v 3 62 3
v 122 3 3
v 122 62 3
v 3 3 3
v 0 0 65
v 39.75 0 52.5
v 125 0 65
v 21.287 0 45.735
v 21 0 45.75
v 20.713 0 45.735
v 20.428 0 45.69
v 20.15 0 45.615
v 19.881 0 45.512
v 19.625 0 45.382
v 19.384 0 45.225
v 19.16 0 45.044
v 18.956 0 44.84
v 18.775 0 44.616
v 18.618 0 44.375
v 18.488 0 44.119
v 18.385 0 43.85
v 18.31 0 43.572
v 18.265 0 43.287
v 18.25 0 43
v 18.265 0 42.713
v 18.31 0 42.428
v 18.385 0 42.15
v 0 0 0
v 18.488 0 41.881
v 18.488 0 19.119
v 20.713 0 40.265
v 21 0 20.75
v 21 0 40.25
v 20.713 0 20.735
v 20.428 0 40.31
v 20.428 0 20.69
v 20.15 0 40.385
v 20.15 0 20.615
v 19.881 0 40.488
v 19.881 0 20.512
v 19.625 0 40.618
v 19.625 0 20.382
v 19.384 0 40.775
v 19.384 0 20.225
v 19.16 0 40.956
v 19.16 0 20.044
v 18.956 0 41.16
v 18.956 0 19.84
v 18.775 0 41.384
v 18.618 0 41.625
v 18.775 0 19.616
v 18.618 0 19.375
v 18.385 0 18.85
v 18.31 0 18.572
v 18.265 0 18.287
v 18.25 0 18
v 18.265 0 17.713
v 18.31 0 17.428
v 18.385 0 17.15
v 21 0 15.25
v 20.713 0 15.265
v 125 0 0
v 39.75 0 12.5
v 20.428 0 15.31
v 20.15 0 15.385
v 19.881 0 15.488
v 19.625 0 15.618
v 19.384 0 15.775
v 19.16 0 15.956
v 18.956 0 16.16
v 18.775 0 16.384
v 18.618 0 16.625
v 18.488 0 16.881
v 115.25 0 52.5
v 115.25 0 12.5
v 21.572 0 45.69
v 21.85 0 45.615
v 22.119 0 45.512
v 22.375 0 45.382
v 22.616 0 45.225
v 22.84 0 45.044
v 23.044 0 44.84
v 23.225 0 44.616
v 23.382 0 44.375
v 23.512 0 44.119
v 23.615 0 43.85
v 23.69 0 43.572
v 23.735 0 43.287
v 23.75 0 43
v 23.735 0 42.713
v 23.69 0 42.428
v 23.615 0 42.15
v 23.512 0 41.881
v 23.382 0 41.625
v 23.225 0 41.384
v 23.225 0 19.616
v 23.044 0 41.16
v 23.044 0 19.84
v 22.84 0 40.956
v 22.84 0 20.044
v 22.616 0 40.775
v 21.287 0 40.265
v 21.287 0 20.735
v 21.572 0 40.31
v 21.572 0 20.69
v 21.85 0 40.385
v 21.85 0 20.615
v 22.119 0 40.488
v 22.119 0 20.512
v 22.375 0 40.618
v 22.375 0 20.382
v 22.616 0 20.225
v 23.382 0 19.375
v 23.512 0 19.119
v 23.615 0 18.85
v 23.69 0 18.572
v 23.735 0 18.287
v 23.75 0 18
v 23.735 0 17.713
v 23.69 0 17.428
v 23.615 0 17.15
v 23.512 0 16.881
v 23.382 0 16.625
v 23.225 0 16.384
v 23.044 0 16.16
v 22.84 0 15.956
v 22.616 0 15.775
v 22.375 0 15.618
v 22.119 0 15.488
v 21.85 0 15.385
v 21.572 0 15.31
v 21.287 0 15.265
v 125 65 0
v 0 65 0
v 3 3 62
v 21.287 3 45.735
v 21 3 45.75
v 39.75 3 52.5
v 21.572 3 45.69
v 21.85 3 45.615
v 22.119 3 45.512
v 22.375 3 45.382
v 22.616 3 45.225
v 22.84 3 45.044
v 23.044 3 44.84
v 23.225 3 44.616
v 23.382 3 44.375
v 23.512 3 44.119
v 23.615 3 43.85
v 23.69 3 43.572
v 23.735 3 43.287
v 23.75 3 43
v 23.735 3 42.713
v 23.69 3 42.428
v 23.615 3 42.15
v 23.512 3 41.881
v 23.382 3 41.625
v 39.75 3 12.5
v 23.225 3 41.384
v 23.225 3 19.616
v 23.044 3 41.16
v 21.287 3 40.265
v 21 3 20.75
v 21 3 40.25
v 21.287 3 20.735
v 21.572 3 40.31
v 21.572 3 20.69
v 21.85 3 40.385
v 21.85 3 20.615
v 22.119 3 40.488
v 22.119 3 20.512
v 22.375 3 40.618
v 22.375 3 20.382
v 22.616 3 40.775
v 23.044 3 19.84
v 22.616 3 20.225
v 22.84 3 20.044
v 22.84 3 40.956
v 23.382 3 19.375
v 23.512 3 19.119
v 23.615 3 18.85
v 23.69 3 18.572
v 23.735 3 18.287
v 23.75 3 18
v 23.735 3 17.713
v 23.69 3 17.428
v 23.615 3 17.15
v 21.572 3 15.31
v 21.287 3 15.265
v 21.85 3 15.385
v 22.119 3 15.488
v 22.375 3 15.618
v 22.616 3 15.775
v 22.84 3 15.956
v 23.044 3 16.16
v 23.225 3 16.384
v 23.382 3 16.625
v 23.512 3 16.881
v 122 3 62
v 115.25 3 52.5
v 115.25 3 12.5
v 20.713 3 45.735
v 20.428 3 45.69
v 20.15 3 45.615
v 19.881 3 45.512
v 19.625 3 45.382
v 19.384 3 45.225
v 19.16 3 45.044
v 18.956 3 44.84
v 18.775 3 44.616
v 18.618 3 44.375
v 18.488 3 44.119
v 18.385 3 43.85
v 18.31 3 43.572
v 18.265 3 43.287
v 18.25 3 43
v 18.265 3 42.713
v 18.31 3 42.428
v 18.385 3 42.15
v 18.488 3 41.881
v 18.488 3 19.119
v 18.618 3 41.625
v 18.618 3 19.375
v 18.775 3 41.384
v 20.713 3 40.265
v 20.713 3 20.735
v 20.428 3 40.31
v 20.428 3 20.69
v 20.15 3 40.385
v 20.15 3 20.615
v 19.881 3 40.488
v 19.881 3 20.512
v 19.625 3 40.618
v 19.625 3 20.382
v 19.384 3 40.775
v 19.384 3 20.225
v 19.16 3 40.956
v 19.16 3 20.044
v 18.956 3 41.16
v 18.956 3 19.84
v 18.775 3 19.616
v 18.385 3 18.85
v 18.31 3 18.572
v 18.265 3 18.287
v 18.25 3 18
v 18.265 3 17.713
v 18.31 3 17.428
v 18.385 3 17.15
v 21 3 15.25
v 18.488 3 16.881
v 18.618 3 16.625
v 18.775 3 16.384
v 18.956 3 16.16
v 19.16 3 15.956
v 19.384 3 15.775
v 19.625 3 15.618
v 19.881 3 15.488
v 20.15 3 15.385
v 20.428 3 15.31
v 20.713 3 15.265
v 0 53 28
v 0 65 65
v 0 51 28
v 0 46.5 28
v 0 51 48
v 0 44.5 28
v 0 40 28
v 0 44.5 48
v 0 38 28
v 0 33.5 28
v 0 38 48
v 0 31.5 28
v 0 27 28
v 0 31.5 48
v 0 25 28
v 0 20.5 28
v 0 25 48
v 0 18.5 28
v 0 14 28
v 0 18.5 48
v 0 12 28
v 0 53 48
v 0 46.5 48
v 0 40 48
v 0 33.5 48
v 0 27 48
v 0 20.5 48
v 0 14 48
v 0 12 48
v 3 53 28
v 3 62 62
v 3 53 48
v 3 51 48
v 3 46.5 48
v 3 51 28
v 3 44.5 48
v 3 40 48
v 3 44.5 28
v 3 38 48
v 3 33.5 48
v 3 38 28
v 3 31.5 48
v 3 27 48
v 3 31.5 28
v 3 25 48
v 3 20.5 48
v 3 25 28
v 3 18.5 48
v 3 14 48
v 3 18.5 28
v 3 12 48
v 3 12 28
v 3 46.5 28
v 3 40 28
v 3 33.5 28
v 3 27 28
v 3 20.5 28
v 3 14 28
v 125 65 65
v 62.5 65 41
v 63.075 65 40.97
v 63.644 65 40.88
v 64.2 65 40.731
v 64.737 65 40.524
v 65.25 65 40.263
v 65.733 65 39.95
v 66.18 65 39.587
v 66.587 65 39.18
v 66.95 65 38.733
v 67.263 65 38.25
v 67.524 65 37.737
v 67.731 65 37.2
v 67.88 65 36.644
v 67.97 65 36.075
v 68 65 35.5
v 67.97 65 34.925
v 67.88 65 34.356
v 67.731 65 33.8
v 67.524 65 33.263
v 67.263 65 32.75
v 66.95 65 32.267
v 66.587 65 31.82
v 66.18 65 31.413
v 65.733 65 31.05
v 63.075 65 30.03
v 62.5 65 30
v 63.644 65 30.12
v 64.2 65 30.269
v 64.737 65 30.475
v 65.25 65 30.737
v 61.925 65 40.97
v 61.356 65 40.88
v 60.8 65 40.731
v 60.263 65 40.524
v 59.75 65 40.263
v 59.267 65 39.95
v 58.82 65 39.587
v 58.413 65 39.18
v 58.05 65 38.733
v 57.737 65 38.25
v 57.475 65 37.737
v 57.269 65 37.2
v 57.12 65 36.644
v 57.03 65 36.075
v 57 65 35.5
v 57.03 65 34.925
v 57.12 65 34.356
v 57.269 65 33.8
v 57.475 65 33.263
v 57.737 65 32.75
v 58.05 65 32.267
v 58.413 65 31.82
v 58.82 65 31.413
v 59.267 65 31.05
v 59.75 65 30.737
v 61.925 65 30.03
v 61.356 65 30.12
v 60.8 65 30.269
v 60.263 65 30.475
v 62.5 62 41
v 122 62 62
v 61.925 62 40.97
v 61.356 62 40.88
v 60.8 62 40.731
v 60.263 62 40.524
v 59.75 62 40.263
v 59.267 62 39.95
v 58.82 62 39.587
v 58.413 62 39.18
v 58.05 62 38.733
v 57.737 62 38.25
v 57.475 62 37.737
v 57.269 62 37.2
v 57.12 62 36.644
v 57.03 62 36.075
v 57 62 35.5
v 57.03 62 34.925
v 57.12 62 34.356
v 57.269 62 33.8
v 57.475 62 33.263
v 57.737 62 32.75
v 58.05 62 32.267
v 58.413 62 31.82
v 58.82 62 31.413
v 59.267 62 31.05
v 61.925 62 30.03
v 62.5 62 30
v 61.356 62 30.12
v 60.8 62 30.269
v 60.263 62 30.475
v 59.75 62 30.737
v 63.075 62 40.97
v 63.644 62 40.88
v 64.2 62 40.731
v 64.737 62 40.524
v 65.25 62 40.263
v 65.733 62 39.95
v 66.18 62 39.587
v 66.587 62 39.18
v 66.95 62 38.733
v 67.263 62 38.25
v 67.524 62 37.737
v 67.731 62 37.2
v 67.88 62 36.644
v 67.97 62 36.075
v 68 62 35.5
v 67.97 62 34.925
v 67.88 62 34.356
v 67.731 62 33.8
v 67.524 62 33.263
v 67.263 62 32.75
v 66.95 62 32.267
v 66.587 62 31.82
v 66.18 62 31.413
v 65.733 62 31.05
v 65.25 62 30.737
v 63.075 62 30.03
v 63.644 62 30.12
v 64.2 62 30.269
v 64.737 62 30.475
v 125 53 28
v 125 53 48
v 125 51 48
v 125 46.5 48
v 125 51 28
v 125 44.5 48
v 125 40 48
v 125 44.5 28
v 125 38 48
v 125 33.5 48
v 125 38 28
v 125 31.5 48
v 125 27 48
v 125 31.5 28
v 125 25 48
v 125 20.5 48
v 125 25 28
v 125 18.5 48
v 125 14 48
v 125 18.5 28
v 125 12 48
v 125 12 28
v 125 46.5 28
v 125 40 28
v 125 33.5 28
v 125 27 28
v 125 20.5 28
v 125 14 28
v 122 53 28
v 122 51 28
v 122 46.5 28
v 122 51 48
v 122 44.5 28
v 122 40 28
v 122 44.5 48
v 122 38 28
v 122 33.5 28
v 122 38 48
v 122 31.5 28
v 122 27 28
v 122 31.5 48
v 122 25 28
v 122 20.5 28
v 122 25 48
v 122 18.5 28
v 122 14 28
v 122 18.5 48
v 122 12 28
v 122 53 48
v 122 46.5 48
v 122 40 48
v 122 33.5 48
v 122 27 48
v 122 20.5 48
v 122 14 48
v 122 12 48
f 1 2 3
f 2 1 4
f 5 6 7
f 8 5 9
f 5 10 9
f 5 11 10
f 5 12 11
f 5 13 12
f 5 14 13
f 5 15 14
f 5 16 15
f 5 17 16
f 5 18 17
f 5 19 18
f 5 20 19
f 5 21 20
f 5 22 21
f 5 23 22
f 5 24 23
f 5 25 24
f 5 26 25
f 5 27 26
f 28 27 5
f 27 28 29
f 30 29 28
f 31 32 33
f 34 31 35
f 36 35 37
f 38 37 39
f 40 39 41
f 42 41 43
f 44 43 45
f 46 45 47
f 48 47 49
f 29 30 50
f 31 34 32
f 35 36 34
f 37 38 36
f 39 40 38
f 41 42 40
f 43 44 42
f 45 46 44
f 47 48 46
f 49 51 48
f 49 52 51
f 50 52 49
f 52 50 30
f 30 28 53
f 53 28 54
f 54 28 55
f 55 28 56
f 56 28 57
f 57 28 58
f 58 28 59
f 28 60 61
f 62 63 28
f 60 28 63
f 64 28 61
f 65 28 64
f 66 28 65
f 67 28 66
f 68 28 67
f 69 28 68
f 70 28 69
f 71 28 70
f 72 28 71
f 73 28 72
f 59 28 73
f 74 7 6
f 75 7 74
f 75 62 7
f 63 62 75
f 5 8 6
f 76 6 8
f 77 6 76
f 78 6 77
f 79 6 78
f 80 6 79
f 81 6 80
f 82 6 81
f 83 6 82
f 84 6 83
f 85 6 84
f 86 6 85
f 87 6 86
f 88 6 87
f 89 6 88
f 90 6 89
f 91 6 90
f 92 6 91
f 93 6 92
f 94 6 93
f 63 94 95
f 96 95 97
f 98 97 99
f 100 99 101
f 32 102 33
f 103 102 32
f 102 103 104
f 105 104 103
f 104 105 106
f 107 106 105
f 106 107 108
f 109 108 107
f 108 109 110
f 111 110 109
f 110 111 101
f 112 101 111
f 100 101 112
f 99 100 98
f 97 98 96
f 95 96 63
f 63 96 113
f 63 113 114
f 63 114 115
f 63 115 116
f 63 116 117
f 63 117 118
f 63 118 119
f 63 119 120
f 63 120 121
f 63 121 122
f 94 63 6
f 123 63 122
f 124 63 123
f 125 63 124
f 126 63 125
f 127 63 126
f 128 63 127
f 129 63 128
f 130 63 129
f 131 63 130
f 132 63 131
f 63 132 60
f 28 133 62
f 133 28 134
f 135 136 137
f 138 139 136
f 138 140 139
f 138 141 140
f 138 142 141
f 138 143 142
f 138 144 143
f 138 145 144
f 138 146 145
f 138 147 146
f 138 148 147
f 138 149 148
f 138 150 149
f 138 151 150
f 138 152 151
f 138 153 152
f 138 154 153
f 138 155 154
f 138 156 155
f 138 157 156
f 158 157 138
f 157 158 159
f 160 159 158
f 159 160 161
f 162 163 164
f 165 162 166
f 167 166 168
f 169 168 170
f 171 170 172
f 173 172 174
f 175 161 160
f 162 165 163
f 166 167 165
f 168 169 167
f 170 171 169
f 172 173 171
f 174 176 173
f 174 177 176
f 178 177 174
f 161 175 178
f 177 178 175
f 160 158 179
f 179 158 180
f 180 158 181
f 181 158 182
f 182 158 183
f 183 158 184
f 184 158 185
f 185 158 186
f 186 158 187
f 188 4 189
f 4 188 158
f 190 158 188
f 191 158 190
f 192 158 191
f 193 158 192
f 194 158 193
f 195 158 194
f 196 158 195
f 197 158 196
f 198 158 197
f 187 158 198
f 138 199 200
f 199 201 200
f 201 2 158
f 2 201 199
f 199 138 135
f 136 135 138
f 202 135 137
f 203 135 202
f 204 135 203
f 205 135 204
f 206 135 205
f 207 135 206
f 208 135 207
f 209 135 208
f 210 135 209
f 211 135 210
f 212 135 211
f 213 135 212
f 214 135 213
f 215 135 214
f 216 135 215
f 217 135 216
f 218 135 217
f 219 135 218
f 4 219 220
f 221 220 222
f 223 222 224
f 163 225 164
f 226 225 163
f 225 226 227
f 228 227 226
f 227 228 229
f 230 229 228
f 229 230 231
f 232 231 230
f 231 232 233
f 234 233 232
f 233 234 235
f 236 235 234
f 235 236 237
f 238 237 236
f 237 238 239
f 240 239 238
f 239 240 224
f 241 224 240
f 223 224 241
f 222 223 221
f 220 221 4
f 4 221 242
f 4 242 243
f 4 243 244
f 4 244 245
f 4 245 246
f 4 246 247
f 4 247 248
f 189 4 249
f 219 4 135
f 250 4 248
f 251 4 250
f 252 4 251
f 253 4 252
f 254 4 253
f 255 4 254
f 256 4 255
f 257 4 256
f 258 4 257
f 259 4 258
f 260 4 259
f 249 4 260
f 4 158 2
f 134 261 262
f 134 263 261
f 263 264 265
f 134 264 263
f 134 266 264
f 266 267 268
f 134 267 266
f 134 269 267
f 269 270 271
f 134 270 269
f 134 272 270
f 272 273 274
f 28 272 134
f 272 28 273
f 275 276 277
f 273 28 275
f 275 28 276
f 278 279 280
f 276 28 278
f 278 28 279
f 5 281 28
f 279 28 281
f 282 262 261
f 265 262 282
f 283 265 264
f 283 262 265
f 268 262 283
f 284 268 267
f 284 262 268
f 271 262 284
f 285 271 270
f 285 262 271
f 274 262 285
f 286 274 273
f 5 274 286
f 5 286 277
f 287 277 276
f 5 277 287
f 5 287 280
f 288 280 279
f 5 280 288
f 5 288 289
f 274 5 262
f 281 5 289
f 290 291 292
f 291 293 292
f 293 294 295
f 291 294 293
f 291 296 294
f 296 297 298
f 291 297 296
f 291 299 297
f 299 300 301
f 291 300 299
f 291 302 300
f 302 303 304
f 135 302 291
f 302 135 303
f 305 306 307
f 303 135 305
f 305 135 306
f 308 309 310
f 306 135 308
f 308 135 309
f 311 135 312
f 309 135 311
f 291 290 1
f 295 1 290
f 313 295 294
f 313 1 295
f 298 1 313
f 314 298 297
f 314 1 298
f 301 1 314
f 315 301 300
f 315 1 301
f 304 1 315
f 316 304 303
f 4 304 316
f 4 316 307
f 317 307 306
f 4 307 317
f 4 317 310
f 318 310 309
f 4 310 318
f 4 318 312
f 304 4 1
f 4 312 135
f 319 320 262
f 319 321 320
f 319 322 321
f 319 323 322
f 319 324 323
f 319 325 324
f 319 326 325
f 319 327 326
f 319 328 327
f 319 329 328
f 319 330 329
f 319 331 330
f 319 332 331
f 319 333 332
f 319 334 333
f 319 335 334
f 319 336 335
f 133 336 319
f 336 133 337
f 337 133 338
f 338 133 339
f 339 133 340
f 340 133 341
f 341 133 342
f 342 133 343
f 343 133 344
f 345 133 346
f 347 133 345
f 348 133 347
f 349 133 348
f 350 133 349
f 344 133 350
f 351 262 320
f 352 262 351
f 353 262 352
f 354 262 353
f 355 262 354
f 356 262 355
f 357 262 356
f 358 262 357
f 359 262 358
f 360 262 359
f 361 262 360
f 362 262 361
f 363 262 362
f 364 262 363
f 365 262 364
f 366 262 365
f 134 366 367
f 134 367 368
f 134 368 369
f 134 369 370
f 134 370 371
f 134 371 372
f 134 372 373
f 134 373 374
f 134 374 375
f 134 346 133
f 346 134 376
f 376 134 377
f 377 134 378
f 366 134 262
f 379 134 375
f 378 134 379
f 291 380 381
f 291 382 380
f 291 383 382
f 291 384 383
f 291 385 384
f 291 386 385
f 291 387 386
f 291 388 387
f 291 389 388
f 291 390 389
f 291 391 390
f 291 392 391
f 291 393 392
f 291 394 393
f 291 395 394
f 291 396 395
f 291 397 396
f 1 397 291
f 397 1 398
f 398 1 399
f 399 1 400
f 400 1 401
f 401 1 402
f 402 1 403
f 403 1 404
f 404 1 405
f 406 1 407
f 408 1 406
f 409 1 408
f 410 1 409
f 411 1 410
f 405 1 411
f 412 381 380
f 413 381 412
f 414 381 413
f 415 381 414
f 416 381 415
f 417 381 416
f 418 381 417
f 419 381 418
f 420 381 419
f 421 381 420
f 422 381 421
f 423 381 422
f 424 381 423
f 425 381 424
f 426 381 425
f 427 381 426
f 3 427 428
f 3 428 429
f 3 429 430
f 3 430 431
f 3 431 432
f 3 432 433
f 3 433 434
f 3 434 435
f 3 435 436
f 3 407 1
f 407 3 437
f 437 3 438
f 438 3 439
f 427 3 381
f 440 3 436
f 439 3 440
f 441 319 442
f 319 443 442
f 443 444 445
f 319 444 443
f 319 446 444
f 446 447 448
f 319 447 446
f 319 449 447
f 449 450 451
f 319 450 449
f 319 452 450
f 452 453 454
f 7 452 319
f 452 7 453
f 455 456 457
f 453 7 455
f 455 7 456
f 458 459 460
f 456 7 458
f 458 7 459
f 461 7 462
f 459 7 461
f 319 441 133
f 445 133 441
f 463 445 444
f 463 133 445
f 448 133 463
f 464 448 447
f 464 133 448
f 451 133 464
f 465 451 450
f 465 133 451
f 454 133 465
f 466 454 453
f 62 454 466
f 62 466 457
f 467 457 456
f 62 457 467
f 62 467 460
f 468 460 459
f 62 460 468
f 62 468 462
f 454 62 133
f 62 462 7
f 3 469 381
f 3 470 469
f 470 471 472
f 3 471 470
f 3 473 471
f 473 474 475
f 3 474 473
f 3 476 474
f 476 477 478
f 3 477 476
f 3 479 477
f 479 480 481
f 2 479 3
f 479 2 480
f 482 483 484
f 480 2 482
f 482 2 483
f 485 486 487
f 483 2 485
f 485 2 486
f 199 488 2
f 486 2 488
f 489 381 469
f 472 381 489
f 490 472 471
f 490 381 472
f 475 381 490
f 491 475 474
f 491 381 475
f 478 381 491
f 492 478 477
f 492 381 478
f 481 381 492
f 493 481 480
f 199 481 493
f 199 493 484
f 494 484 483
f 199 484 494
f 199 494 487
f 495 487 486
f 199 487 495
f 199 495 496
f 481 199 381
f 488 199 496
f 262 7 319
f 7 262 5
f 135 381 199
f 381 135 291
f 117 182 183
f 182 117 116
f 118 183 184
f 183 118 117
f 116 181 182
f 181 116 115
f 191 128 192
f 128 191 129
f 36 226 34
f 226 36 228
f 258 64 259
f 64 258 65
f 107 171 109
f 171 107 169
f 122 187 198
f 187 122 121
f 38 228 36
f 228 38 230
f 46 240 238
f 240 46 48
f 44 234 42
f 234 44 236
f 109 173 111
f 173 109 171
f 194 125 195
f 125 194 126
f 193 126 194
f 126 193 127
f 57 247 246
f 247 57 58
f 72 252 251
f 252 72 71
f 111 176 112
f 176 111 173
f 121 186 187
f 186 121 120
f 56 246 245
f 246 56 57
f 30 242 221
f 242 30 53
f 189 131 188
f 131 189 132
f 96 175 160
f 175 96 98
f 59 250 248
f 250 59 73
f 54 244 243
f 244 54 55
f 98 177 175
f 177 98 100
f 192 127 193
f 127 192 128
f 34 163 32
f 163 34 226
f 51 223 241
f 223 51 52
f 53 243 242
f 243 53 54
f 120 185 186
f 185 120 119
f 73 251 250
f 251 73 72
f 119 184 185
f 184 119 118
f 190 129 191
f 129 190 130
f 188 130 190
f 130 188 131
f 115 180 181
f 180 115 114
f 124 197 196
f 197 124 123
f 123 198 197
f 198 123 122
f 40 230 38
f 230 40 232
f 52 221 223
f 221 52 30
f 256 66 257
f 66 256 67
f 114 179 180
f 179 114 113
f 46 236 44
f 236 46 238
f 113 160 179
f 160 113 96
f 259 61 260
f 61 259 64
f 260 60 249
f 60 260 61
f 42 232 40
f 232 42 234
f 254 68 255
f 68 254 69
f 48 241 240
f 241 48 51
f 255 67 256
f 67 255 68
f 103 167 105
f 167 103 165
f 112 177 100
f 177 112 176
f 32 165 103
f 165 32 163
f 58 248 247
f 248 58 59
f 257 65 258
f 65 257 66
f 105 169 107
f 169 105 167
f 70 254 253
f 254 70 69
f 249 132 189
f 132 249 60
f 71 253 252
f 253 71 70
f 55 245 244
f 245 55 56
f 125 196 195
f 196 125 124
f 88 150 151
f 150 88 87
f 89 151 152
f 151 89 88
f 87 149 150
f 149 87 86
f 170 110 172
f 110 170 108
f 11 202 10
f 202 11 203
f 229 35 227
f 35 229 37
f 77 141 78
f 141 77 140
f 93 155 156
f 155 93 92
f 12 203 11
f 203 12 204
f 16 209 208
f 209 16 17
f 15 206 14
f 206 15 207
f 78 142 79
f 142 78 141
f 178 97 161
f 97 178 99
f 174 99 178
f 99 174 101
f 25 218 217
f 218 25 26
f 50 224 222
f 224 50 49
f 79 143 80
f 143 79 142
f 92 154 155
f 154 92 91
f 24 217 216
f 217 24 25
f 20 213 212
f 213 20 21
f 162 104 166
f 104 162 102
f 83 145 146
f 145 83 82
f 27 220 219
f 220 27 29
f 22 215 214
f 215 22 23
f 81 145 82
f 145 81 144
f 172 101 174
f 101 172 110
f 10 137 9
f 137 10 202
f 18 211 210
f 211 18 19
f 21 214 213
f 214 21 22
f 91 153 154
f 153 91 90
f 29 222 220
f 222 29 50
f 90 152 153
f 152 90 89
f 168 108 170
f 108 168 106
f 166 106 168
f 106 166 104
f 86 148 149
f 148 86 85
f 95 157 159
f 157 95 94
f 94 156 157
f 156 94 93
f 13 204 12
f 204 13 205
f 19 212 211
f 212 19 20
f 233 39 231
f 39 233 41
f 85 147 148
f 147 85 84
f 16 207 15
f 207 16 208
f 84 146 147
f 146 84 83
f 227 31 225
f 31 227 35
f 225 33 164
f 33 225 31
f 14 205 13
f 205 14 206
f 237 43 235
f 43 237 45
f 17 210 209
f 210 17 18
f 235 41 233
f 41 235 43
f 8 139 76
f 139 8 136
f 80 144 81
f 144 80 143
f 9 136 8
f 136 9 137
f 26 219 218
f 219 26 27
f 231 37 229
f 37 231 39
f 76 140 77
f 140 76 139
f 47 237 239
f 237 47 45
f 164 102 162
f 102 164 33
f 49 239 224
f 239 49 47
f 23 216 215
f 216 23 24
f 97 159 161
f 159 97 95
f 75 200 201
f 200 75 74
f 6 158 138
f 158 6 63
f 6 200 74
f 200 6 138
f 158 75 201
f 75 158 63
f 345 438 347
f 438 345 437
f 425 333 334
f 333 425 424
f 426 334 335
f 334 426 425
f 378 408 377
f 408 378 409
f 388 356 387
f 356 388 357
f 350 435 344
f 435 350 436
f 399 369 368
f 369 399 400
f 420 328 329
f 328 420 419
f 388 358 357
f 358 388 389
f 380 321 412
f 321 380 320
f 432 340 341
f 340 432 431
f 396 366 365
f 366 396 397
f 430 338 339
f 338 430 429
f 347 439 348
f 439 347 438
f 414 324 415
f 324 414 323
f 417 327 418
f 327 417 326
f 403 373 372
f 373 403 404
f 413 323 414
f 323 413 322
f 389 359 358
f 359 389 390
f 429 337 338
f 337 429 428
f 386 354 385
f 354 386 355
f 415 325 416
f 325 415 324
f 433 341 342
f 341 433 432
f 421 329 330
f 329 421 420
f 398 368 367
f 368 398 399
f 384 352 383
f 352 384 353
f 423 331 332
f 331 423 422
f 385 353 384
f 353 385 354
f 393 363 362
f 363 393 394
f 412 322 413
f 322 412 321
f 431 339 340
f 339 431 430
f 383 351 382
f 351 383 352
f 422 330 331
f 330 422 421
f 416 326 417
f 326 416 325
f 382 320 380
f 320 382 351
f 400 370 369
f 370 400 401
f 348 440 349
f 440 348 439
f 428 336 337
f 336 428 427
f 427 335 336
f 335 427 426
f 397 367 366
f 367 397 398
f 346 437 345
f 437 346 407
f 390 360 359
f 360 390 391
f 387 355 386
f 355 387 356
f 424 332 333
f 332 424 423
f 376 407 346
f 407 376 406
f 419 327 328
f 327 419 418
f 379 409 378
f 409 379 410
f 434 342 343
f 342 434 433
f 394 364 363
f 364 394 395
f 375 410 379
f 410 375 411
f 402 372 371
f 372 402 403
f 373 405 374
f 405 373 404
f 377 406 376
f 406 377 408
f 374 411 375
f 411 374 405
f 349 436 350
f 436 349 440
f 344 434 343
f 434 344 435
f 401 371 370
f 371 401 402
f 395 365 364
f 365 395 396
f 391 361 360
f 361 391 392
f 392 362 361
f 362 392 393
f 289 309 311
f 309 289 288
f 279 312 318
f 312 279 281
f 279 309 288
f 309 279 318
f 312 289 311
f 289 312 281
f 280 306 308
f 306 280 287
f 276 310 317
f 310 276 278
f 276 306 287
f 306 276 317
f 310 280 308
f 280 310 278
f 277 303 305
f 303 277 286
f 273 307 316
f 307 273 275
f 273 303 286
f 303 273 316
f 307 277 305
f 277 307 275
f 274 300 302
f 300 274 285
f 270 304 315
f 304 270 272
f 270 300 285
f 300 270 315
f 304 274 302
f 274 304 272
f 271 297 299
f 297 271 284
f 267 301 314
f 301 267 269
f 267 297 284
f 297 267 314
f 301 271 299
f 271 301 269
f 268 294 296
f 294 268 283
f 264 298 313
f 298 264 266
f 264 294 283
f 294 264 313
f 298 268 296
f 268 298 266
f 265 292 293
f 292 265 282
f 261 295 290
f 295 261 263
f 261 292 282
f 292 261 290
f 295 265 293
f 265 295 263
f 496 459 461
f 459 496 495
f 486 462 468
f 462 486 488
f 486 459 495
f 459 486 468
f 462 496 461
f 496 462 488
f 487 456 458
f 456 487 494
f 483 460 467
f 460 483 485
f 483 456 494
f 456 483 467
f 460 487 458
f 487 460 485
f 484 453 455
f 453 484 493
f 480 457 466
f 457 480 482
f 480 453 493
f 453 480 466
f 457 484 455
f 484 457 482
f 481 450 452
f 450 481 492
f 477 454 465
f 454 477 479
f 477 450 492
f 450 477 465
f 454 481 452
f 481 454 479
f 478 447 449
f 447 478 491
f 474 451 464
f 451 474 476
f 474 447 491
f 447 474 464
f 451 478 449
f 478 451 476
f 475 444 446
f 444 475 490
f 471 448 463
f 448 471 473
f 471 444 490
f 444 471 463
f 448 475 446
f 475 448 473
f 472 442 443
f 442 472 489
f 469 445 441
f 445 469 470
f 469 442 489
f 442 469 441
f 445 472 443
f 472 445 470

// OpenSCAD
include <lasercut.scad>; 

$fn = 60;

// The wood thickness
thickness = 3.0;

X1 = 95;  // DPS3005 space
X2 = 30;  // Banana plug space
Y = 65;
Z = 65;

X = X1 + X2;

DC55_21_diam = 11.0;
D_banana = 5.5;

DPS_hole_x = 75.5;
DPS_hole_z = 40;

cutouts_count = 7;
cutouts_thickness = 2;
cutouts_height = 20;
cutouts_offset = 10;
cutouts_step = (Y - 2 * (cutouts_offset + thickness)) / (cutouts_count - 1);
cutouts_array = [for (yi = [0:cutouts_count-1]) [25, yi * cutouts_step + cutouts_offset - cutouts_thickness / 2, cutouts_height, cutouts_thickness]];

echo(cutouts_array);


color("Gold",0.75)
lasercutoutBox(thickness=thickness, x=X, y=Y, z=Z, sides=6, num_fingers=4,
    cutouts_a = [
        [],
        [],
        [[X2 + (X1 - DPS_hole_x) / 2 - thickness, (Z - DPS_hole_z) / 2 - thickness, DPS_hole_x, DPS_hole_z]],
        [],
        cutouts_array,
        cutouts_array
    ],
    circles_remove_a = [
        [],
        [],
        [[D_banana / 2, X2 / 2 + thickness, 15], [D_banana / 2, X2 / 2 + thickness, 40]],
        [[DC55_21_diam / 2, X / 2 - thickness, Y / 2]],
    ]
);
